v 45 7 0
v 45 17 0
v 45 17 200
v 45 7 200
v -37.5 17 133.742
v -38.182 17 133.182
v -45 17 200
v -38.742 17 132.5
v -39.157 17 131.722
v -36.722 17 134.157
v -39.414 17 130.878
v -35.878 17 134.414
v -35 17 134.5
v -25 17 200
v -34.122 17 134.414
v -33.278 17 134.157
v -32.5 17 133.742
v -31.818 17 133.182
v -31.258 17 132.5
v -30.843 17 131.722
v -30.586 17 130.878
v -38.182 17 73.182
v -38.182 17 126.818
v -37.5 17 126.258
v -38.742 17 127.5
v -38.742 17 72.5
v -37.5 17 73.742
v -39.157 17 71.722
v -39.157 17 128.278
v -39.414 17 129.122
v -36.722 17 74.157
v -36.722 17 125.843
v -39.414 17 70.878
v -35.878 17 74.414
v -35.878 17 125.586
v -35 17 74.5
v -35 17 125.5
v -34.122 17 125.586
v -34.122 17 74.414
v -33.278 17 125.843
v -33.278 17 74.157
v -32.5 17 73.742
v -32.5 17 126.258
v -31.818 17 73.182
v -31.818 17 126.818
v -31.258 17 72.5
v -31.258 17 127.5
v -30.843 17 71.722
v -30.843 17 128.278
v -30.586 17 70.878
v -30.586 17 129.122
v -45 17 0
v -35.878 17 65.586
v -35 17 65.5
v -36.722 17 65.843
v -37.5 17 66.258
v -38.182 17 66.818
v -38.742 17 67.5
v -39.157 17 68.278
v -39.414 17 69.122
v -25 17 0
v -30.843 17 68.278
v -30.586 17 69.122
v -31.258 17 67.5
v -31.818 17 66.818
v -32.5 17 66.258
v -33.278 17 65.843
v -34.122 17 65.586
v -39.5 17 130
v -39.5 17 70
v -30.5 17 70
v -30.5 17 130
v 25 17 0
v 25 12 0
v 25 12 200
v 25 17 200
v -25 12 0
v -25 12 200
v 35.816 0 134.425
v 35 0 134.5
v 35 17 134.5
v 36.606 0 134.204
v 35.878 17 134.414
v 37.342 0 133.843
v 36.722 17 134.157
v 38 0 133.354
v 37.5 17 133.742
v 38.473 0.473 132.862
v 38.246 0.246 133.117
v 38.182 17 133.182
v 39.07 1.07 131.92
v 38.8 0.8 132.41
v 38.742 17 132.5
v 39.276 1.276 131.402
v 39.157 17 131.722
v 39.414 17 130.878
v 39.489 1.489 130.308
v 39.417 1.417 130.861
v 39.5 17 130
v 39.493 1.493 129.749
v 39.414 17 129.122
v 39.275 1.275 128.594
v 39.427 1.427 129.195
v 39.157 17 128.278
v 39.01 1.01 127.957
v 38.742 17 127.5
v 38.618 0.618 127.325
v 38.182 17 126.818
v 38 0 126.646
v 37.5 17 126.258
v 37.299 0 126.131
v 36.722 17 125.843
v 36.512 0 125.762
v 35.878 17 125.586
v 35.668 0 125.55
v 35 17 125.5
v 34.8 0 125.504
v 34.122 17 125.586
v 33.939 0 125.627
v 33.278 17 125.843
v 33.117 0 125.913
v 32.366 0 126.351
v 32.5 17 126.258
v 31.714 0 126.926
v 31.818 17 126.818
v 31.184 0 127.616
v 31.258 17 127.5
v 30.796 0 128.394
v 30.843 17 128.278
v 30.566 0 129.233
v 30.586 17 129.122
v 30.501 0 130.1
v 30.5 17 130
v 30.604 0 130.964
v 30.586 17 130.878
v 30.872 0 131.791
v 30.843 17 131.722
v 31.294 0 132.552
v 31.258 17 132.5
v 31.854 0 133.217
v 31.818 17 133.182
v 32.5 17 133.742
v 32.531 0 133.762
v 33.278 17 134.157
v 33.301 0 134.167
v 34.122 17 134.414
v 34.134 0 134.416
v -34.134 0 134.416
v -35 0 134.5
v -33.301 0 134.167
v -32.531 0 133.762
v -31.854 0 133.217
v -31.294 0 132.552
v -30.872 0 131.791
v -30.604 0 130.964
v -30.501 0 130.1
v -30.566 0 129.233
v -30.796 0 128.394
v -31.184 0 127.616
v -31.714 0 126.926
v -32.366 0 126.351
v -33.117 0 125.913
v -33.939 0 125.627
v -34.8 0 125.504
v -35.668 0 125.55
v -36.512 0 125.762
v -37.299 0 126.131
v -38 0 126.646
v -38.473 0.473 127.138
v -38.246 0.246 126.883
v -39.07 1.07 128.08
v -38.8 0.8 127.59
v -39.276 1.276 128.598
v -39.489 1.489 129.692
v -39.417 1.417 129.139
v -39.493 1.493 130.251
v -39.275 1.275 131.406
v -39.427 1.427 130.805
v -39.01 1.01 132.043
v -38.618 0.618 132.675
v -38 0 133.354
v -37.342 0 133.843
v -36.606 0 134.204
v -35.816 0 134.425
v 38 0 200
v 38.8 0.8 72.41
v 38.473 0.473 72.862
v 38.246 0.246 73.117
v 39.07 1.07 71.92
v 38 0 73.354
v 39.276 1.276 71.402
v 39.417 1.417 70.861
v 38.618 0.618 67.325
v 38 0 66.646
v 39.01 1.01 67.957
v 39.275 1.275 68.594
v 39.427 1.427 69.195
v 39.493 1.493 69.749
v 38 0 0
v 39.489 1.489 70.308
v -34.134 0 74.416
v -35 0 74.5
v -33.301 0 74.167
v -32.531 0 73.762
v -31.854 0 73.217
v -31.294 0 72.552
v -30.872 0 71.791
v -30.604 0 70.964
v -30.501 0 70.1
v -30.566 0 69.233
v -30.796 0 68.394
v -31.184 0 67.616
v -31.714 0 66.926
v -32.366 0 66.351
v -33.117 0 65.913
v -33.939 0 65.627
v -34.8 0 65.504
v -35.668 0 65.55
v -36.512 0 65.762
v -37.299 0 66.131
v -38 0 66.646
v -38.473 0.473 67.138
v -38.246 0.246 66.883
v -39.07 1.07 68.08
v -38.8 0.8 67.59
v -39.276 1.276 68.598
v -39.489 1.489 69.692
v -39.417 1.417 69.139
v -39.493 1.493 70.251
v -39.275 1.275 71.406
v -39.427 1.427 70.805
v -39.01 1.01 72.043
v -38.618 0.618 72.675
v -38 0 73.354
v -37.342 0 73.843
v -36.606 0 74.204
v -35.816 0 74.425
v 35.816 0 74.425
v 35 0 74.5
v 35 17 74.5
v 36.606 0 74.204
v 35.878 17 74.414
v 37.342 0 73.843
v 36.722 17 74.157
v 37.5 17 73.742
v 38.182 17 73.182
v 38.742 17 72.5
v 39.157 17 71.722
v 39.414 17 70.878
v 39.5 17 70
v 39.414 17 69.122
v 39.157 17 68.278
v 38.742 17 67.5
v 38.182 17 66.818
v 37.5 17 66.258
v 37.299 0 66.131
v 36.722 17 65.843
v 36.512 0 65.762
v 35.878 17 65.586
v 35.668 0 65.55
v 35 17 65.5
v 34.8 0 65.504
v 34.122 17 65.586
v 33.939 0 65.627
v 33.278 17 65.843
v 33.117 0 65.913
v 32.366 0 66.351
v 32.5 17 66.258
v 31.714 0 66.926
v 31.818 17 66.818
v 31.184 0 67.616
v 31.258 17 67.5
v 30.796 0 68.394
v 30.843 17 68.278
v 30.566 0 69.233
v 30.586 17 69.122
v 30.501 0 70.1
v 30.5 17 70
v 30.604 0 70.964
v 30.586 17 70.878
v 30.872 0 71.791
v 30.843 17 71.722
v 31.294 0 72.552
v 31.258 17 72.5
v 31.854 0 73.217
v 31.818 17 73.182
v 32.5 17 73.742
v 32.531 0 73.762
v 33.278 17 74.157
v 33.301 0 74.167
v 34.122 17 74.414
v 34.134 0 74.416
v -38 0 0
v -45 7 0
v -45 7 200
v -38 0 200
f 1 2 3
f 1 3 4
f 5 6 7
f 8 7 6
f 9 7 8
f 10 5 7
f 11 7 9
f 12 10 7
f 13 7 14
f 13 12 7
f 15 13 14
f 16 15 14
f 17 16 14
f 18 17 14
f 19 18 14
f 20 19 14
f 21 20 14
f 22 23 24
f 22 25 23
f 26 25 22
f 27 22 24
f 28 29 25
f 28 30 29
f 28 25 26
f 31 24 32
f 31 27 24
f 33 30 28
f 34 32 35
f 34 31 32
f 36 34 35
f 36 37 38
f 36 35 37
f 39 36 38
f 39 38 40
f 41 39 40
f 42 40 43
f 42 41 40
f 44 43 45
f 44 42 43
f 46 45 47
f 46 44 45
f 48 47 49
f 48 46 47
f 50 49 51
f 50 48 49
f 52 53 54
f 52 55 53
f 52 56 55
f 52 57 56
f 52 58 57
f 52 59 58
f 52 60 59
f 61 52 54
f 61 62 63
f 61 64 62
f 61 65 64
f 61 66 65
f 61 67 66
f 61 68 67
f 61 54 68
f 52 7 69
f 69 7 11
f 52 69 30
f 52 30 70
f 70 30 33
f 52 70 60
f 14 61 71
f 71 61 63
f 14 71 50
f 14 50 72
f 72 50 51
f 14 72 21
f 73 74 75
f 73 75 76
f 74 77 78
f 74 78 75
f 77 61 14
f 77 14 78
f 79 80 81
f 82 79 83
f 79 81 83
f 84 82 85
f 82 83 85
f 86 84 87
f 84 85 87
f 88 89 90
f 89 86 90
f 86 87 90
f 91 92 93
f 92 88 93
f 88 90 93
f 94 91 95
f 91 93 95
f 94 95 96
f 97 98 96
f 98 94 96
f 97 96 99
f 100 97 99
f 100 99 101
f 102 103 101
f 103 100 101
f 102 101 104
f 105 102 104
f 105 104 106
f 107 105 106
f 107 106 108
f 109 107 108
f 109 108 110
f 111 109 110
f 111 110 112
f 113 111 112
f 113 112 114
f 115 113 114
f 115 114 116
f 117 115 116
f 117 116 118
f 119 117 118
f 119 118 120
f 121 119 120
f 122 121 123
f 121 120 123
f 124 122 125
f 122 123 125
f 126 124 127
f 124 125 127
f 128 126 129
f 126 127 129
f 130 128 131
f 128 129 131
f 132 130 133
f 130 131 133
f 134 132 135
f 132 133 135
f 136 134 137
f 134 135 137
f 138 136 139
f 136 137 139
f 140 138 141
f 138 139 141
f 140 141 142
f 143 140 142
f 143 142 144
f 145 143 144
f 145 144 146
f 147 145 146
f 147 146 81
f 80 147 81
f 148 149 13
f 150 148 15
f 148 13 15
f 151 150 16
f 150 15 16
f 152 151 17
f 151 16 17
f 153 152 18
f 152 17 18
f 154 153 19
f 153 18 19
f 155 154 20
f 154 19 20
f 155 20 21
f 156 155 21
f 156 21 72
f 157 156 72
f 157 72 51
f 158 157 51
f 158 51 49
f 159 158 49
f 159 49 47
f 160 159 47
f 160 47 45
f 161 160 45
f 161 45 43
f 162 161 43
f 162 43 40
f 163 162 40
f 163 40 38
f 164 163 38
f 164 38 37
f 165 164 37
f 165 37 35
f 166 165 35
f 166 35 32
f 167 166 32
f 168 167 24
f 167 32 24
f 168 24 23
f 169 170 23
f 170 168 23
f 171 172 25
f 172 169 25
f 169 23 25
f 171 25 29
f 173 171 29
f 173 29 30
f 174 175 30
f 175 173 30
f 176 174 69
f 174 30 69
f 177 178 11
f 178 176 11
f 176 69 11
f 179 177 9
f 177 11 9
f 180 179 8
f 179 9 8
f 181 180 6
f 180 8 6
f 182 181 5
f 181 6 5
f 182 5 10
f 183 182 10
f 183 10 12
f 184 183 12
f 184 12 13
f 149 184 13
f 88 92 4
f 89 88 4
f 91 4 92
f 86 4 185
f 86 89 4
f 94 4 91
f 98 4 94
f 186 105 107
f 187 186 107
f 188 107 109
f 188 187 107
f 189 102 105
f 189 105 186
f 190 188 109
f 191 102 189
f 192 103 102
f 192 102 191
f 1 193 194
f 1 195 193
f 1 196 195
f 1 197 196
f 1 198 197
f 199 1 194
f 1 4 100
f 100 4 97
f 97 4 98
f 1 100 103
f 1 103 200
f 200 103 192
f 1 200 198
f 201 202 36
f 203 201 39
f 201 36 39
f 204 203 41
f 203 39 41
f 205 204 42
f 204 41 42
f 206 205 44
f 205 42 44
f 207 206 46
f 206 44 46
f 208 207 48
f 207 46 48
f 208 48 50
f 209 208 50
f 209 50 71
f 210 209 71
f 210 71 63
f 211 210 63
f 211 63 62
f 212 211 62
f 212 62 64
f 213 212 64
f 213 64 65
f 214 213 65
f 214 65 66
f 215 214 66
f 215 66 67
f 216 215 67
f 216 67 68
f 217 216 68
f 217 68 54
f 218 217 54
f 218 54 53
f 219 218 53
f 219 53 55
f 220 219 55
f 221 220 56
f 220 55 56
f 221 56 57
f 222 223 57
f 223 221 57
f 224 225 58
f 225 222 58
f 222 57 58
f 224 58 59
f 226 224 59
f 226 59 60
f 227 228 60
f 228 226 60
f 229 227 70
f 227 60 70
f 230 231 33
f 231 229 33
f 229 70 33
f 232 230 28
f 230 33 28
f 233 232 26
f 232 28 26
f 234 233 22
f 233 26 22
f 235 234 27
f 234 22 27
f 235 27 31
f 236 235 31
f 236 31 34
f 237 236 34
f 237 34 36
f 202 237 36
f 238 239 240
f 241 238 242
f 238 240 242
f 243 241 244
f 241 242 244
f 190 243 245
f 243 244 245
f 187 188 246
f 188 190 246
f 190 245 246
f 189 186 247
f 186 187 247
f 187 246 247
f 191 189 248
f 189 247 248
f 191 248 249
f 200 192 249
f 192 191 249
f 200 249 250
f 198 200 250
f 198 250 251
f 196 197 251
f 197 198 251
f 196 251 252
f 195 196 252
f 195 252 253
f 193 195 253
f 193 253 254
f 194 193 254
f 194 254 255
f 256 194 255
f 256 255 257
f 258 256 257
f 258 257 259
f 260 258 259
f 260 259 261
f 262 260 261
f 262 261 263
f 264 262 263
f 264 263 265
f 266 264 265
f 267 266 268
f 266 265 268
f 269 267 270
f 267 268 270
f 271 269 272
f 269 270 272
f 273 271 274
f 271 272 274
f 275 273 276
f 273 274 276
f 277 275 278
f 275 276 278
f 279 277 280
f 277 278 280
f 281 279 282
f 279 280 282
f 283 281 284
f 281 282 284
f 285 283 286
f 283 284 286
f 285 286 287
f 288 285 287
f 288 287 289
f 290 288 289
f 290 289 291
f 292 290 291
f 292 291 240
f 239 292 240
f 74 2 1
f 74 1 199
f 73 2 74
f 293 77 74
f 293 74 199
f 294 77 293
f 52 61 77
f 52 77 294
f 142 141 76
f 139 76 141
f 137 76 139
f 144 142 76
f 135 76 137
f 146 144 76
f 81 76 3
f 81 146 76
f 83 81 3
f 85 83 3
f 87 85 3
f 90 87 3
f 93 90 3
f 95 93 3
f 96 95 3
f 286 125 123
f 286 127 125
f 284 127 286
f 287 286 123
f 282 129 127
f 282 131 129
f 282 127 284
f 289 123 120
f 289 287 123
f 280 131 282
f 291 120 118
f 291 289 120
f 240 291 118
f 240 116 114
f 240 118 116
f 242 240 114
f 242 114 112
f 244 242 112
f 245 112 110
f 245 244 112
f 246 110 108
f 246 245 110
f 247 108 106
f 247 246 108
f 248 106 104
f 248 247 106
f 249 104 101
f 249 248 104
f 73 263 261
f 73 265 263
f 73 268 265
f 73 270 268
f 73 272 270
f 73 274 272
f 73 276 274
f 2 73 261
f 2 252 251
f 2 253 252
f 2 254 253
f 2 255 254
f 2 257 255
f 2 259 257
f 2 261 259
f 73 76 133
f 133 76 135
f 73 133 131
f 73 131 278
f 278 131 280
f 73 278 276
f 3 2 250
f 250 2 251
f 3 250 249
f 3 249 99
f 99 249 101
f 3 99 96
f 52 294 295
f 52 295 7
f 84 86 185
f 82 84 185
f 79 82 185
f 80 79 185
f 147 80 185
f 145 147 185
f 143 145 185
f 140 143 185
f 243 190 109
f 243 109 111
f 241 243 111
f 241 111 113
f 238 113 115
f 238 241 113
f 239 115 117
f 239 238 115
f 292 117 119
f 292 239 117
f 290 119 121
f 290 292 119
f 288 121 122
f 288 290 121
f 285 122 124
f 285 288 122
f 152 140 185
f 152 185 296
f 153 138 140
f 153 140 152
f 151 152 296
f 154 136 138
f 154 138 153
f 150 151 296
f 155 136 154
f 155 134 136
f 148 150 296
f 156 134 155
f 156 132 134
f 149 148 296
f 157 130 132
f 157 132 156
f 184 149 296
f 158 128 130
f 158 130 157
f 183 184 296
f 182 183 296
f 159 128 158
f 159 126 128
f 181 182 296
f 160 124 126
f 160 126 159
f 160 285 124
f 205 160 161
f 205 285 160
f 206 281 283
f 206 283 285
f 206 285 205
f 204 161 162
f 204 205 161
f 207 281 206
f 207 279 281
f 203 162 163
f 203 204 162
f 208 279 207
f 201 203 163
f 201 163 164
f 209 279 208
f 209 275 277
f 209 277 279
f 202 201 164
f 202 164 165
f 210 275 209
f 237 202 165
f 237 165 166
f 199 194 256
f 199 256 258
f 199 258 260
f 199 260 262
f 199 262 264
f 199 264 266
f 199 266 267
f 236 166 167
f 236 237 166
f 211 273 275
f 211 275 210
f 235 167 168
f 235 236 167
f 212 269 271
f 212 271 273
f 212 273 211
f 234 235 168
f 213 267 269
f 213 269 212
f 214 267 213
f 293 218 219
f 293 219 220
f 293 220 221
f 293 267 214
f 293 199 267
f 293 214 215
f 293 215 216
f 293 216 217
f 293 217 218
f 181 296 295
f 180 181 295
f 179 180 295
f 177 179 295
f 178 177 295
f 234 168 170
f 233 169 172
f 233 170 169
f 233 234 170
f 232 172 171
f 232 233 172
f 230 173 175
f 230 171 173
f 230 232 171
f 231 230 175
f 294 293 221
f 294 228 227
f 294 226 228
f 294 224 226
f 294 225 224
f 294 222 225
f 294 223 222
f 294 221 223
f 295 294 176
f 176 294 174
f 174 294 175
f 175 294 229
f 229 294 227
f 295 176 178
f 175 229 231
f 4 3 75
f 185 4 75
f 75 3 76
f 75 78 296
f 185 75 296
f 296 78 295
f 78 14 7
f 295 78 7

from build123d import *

# Parameters (mm, degrees)
EXTRUDE_1_DEPTH             = 200
CUT_EXTRUDE_1_REACH         = 207.704
SKETCH_2_R                  = 4.5
PATTERN_LINEAR_1_COUNT      = 2
PATTERN_LINEAR_1_PITCH      = 60
PATTERN_LINEAR_1_COUNT_DIR2 = 2
PATTERN_LINEAR_1_PITCH_DIR2 = 70


with BuildPart() as part:
    # 草图1 → 凸台-拉伸1 (new body)
    with BuildSketch(Plane.XY):
        Polygon((38, 0), (-38, 0), (-45, 7), (-45, 17), (-25, 17), (-25, 12), (25, 12), (25, 17), (45, 17), (45, 7), align=None)
    extrude(amount=EXTRUDE_1_DEPTH)

    # 草图2 → 切除-拉伸1 (cut, up to next)
    with BuildSketch(Plane(origin=(0, 17, 0), x_dir=(1, 0, 0), z_dir=(0, 1, 0)), mode=Mode.PRIVATE) as cut_extrude_1_sk1:
        with Locations(Location((-35, -130, 0), (0, 0, 270))):
            Circle(SKETCH_2_R)
    cut_extrude_1_tool1 = extrude(cut_extrude_1_sk1.sketch, amount=-CUT_EXTRUDE_1_REACH, mode=Mode.PRIVATE) & part.part
    cut_extrude_1 = cut_extrude_1_tool1.solids().sort_by_distance((-35, 17, 130))[0]
    add(cut_extrude_1, mode=Mode.SUBTRACT)

    # 阵列(线性)1: 切除-拉伸1; each copy of 切除-拉伸1 runs up to whatever stops it at its own place
    pattern_linear_1_before = part.part  # the part as the pattern finds it: every copy runs up to it
    pattern_linear_1_cut_extrude_1_long = extrude(cut_extrude_1_sk1.sketch, amount=-CUT_EXTRUDE_1_REACH, mode=Mode.PRIVATE)
    pattern_linear_1_cut_extrude_1_tool1 = pattern_linear_1_cut_extrude_1_long.moved(Location(Vector(0, 0, -1) * (0 * PATTERN_LINEAR_1_PITCH) + Vector(1, 0, 0) * (1 * PATTERN_LINEAR_1_PITCH_DIR2))) & pattern_linear_1_before
    add(pattern_linear_1_cut_extrude_1_tool1.solids().sort_by_distance((35, 17, 130))[0], mode=Mode.SUBTRACT)
    pattern_linear_1_cut_extrude_1_tool2 = pattern_linear_1_cut_extrude_1_long.moved(Location(Vector(0, 0, -1) * (1 * PATTERN_LINEAR_1_PITCH) + Vector(1, 0, 0) * (0 * PATTERN_LINEAR_1_PITCH_DIR2))) & pattern_linear_1_before
    add(pattern_linear_1_cut_extrude_1_tool2.solids().sort_by_distance((-35, 17, 70))[0], mode=Mode.SUBTRACT)
    pattern_linear_1_cut_extrude_1_tool3 = pattern_linear_1_cut_extrude_1_long.moved(Location(Vector(0, 0, -1) * (1 * PATTERN_LINEAR_1_PITCH) + Vector(1, 0, 0) * (1 * PATTERN_LINEAR_1_PITCH_DIR2))) & pattern_linear_1_before
    add(pattern_linear_1_cut_extrude_1_tool3.solids().sort_by_distance((35, 17, 70))[0], mode=Mode.SUBTRACT)


solid = part.part
